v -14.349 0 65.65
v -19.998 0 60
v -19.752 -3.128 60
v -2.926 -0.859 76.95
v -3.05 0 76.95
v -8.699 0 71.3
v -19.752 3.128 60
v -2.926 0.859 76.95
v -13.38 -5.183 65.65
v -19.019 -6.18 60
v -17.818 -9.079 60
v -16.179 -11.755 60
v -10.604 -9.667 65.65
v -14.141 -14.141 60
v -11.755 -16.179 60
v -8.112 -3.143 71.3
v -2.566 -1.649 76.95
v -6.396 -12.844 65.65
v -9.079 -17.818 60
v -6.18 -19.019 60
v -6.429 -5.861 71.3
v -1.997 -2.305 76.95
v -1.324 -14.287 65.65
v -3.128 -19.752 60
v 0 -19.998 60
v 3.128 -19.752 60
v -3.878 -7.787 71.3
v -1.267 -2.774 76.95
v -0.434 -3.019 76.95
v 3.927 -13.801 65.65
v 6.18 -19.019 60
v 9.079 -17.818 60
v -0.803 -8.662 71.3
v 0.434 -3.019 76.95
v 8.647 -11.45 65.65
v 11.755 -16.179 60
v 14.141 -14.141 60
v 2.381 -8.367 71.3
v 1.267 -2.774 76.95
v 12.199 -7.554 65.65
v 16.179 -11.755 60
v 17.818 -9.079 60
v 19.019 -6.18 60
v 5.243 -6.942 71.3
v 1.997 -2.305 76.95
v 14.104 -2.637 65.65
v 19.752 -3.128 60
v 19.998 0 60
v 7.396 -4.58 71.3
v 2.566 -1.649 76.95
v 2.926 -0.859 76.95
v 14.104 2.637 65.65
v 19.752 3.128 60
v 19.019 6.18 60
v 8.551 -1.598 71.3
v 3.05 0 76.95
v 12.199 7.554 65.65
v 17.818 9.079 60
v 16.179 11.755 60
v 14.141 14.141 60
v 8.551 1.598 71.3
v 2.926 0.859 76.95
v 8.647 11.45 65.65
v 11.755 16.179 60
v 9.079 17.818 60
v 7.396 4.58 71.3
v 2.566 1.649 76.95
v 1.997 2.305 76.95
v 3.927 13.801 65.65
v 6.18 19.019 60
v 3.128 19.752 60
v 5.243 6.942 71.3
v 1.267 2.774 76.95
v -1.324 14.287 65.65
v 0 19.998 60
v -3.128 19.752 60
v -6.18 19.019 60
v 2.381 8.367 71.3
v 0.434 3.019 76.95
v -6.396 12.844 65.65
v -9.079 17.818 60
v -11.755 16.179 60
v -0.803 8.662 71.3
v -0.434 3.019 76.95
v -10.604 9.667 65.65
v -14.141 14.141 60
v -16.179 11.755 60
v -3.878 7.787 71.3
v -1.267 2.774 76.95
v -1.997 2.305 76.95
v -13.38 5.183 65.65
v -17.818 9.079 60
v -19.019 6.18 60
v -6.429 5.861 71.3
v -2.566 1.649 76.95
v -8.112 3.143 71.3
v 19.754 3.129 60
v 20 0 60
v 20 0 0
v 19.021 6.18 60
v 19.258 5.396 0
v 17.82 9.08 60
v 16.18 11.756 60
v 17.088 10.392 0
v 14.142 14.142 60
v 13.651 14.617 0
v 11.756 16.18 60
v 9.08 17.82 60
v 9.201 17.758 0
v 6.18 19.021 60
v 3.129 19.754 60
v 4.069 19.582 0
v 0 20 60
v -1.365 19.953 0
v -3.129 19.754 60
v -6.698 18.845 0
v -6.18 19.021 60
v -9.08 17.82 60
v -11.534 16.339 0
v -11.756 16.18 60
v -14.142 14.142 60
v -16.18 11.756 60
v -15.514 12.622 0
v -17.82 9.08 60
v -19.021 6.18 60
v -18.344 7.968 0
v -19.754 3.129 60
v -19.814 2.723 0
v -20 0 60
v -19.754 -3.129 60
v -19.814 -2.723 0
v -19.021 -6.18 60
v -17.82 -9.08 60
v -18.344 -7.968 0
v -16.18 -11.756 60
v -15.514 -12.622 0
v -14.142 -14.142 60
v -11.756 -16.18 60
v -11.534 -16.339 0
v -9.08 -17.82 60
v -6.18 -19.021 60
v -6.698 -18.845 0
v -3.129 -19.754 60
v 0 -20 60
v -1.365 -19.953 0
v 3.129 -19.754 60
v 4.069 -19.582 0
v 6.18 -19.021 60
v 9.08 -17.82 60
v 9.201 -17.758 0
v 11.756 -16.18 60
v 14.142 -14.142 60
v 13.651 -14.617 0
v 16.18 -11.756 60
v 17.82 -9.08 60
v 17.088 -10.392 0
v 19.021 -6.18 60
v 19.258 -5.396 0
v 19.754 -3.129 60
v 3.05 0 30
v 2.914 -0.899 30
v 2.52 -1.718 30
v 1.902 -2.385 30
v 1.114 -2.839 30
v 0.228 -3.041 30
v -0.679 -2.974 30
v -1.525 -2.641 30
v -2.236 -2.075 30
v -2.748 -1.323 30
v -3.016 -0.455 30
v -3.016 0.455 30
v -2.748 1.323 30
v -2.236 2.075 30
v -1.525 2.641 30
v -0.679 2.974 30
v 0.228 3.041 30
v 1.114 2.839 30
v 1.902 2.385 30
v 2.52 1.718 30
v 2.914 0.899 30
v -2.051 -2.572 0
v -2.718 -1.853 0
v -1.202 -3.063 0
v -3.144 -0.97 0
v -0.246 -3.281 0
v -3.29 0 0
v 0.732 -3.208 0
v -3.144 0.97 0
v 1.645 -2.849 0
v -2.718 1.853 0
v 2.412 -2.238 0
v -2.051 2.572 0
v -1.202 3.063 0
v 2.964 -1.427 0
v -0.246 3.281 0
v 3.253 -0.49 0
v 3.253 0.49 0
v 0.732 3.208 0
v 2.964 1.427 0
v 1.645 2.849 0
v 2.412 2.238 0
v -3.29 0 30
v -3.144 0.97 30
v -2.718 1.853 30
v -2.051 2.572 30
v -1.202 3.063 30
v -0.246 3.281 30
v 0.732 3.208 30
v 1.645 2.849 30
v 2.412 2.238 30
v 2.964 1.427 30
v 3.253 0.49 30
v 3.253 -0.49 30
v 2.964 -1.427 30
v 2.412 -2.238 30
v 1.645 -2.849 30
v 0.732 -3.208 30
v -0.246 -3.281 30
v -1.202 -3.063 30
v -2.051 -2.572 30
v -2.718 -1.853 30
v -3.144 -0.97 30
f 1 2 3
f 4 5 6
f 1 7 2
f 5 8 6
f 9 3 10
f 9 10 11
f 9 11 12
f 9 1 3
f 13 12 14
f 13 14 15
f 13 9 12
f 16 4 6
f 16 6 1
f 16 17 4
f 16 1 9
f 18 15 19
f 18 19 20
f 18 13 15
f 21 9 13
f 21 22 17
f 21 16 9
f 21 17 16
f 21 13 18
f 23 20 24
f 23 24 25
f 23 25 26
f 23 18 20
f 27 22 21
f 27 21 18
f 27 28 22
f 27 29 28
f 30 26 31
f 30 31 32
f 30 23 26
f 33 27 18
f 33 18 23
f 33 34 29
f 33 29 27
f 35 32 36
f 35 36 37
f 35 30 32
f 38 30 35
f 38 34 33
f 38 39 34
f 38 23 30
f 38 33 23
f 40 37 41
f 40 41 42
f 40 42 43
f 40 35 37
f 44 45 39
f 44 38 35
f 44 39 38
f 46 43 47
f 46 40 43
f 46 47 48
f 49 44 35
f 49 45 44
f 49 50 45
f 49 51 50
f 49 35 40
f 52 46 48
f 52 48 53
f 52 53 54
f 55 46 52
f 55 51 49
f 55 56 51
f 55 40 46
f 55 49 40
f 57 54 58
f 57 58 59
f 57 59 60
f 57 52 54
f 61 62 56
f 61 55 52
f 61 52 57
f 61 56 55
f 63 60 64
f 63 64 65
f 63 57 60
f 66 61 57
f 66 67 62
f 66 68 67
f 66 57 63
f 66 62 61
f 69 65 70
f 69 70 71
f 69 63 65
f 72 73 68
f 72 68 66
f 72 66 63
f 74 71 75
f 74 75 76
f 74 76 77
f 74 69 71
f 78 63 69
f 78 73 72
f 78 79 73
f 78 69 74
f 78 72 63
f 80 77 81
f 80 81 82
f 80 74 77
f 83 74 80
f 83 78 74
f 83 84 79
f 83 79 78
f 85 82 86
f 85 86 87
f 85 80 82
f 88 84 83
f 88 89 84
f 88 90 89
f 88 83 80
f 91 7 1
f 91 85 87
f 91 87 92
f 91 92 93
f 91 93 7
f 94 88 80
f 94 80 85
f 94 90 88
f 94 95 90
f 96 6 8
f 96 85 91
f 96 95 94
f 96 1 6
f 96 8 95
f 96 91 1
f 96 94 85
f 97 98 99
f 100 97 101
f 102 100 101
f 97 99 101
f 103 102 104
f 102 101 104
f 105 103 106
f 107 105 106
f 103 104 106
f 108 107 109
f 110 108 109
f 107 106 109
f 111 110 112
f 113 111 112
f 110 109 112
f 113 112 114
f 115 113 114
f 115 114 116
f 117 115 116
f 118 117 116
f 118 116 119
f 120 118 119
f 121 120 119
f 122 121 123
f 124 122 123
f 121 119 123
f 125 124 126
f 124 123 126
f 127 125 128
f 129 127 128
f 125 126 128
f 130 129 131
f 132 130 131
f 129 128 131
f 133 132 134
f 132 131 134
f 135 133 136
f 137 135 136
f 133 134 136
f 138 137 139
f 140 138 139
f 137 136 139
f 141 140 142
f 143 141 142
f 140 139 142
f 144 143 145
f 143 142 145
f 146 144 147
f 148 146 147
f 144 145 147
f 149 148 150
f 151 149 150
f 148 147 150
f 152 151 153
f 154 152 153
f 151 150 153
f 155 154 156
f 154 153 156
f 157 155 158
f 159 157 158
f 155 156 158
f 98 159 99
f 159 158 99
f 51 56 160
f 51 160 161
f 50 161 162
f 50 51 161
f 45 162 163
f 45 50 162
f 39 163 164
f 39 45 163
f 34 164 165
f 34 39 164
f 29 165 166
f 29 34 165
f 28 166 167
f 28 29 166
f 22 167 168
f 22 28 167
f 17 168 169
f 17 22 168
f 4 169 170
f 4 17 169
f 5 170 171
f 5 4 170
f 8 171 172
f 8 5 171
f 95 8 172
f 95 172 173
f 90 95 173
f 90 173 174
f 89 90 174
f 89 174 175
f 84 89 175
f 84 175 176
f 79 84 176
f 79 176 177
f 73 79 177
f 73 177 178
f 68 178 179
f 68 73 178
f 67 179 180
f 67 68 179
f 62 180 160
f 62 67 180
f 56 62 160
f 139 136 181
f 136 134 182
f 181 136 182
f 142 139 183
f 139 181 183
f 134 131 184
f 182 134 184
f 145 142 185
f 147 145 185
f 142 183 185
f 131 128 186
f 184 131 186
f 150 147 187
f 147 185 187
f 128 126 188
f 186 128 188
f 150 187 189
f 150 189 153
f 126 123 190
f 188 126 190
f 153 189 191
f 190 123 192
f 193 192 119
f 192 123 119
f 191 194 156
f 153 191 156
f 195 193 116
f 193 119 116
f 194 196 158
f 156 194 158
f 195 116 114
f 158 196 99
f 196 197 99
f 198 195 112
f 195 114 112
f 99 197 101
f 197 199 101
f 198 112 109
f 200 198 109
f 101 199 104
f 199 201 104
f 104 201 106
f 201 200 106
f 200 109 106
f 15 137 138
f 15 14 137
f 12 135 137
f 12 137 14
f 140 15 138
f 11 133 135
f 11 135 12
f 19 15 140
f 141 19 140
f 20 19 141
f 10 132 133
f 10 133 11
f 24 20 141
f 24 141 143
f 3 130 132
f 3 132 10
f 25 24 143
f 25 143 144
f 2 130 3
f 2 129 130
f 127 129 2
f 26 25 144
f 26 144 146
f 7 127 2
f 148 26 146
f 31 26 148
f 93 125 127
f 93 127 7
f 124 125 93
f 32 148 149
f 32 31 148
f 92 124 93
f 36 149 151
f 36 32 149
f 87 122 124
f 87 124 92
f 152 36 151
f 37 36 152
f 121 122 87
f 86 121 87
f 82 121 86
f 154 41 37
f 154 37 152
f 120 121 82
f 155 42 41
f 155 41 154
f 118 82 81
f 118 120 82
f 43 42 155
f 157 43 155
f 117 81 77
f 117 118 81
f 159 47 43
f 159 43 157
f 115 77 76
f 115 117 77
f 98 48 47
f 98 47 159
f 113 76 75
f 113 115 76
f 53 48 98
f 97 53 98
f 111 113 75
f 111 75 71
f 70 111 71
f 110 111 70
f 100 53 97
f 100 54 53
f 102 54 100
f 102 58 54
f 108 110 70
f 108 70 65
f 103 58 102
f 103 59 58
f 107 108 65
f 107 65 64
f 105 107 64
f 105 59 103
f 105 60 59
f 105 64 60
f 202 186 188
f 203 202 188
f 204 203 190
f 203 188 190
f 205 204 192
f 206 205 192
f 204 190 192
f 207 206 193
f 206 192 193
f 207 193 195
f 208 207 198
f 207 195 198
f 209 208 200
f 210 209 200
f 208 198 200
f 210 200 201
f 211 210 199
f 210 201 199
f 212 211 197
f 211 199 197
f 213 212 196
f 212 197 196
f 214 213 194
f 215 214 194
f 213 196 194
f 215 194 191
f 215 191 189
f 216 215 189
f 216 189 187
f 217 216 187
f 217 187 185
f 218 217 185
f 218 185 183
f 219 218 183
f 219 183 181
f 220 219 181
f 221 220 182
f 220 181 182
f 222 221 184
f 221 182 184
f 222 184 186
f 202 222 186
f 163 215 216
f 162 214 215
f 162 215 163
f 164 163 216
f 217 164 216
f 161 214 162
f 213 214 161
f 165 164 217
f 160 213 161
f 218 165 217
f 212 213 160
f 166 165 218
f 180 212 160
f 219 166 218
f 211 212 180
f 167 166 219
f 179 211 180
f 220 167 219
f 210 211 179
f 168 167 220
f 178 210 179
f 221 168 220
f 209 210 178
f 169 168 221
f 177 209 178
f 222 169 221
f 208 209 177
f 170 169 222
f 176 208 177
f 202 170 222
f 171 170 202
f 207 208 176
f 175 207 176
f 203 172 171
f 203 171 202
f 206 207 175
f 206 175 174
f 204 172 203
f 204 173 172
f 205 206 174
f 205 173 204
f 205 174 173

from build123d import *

# Parameters (mm, degrees)
SKETCH1_R           = 20
BOSS_EXTRUDE1_DEPTH = 60
SKETCH2_R           = 3.05
CUT_EXTRUDE1_DEPTH  = 30
SKETCH3_R           = 3.29
CUT_EXTRUDE2_DEPTH  = 30
CUT_EXTRUDE3_START  = -100
SKETCH7_R           = 3.05
CUT_EXTRUDE3_DEPTH  = 100


with BuildPart() as part:
    # Sketch1 → Boss-Extrude1 (new body)
    with BuildSketch(Plane.XY):
        Circle(SKETCH1_R)
    extrude(amount=BOSS_EXTRUDE1_DEPTH)

    # Sketch2 → Cut-Extrude1 (cut)
    with BuildSketch(Plane.XY.offset(60)):
        Circle(SKETCH2_R)
    extrude(amount=-CUT_EXTRUDE1_DEPTH, mode=Mode.SUBTRACT)

    # Sketch3 → Cut-Extrude2 (cut)
    with BuildSketch(Plane(origin=(0, 0, 0), x_dir=(-1, 0, 0), z_dir=(0, 0, -1))):
        Circle(SKETCH3_R)
    extrude(amount=-CUT_EXTRUDE2_DEPTH, mode=Mode.SUBTRACT)

    # Sketch6 → Revolve1 (revolve)
    with BuildSketch(Plane(origin=(0, 0, 0), x_dir=(0, 0, -1), z_dir=(1, 0, 0)), mode=Mode.PRIVATE) as revolve1_sk:
        Polygon((-60, 19.998024712), (-80, 0), (-60, 0), align=None)
    revolve(revolve1_sk.sketch.rotate(Axis((0, 0, 60), (0, 0, 1)), 90), axis=Axis((0, 0, 60), (0, 0, 1)))

    # Sketch7 → Cut-Extrude3 (cut)
    with BuildSketch(Plane(origin=(0, 0, 0), x_dir=(-1, 0, 0), z_dir=(0, 0, -1)).offset(CUT_EXTRUDE3_START)):
        with Locations(Location((0, 0, 0), (0, 0, 180))):
            Circle(SKETCH7_R)
    extrude(amount=CUT_EXTRUDE3_DEPTH, mode=Mode.SUBTRACT)


solid = part.part
